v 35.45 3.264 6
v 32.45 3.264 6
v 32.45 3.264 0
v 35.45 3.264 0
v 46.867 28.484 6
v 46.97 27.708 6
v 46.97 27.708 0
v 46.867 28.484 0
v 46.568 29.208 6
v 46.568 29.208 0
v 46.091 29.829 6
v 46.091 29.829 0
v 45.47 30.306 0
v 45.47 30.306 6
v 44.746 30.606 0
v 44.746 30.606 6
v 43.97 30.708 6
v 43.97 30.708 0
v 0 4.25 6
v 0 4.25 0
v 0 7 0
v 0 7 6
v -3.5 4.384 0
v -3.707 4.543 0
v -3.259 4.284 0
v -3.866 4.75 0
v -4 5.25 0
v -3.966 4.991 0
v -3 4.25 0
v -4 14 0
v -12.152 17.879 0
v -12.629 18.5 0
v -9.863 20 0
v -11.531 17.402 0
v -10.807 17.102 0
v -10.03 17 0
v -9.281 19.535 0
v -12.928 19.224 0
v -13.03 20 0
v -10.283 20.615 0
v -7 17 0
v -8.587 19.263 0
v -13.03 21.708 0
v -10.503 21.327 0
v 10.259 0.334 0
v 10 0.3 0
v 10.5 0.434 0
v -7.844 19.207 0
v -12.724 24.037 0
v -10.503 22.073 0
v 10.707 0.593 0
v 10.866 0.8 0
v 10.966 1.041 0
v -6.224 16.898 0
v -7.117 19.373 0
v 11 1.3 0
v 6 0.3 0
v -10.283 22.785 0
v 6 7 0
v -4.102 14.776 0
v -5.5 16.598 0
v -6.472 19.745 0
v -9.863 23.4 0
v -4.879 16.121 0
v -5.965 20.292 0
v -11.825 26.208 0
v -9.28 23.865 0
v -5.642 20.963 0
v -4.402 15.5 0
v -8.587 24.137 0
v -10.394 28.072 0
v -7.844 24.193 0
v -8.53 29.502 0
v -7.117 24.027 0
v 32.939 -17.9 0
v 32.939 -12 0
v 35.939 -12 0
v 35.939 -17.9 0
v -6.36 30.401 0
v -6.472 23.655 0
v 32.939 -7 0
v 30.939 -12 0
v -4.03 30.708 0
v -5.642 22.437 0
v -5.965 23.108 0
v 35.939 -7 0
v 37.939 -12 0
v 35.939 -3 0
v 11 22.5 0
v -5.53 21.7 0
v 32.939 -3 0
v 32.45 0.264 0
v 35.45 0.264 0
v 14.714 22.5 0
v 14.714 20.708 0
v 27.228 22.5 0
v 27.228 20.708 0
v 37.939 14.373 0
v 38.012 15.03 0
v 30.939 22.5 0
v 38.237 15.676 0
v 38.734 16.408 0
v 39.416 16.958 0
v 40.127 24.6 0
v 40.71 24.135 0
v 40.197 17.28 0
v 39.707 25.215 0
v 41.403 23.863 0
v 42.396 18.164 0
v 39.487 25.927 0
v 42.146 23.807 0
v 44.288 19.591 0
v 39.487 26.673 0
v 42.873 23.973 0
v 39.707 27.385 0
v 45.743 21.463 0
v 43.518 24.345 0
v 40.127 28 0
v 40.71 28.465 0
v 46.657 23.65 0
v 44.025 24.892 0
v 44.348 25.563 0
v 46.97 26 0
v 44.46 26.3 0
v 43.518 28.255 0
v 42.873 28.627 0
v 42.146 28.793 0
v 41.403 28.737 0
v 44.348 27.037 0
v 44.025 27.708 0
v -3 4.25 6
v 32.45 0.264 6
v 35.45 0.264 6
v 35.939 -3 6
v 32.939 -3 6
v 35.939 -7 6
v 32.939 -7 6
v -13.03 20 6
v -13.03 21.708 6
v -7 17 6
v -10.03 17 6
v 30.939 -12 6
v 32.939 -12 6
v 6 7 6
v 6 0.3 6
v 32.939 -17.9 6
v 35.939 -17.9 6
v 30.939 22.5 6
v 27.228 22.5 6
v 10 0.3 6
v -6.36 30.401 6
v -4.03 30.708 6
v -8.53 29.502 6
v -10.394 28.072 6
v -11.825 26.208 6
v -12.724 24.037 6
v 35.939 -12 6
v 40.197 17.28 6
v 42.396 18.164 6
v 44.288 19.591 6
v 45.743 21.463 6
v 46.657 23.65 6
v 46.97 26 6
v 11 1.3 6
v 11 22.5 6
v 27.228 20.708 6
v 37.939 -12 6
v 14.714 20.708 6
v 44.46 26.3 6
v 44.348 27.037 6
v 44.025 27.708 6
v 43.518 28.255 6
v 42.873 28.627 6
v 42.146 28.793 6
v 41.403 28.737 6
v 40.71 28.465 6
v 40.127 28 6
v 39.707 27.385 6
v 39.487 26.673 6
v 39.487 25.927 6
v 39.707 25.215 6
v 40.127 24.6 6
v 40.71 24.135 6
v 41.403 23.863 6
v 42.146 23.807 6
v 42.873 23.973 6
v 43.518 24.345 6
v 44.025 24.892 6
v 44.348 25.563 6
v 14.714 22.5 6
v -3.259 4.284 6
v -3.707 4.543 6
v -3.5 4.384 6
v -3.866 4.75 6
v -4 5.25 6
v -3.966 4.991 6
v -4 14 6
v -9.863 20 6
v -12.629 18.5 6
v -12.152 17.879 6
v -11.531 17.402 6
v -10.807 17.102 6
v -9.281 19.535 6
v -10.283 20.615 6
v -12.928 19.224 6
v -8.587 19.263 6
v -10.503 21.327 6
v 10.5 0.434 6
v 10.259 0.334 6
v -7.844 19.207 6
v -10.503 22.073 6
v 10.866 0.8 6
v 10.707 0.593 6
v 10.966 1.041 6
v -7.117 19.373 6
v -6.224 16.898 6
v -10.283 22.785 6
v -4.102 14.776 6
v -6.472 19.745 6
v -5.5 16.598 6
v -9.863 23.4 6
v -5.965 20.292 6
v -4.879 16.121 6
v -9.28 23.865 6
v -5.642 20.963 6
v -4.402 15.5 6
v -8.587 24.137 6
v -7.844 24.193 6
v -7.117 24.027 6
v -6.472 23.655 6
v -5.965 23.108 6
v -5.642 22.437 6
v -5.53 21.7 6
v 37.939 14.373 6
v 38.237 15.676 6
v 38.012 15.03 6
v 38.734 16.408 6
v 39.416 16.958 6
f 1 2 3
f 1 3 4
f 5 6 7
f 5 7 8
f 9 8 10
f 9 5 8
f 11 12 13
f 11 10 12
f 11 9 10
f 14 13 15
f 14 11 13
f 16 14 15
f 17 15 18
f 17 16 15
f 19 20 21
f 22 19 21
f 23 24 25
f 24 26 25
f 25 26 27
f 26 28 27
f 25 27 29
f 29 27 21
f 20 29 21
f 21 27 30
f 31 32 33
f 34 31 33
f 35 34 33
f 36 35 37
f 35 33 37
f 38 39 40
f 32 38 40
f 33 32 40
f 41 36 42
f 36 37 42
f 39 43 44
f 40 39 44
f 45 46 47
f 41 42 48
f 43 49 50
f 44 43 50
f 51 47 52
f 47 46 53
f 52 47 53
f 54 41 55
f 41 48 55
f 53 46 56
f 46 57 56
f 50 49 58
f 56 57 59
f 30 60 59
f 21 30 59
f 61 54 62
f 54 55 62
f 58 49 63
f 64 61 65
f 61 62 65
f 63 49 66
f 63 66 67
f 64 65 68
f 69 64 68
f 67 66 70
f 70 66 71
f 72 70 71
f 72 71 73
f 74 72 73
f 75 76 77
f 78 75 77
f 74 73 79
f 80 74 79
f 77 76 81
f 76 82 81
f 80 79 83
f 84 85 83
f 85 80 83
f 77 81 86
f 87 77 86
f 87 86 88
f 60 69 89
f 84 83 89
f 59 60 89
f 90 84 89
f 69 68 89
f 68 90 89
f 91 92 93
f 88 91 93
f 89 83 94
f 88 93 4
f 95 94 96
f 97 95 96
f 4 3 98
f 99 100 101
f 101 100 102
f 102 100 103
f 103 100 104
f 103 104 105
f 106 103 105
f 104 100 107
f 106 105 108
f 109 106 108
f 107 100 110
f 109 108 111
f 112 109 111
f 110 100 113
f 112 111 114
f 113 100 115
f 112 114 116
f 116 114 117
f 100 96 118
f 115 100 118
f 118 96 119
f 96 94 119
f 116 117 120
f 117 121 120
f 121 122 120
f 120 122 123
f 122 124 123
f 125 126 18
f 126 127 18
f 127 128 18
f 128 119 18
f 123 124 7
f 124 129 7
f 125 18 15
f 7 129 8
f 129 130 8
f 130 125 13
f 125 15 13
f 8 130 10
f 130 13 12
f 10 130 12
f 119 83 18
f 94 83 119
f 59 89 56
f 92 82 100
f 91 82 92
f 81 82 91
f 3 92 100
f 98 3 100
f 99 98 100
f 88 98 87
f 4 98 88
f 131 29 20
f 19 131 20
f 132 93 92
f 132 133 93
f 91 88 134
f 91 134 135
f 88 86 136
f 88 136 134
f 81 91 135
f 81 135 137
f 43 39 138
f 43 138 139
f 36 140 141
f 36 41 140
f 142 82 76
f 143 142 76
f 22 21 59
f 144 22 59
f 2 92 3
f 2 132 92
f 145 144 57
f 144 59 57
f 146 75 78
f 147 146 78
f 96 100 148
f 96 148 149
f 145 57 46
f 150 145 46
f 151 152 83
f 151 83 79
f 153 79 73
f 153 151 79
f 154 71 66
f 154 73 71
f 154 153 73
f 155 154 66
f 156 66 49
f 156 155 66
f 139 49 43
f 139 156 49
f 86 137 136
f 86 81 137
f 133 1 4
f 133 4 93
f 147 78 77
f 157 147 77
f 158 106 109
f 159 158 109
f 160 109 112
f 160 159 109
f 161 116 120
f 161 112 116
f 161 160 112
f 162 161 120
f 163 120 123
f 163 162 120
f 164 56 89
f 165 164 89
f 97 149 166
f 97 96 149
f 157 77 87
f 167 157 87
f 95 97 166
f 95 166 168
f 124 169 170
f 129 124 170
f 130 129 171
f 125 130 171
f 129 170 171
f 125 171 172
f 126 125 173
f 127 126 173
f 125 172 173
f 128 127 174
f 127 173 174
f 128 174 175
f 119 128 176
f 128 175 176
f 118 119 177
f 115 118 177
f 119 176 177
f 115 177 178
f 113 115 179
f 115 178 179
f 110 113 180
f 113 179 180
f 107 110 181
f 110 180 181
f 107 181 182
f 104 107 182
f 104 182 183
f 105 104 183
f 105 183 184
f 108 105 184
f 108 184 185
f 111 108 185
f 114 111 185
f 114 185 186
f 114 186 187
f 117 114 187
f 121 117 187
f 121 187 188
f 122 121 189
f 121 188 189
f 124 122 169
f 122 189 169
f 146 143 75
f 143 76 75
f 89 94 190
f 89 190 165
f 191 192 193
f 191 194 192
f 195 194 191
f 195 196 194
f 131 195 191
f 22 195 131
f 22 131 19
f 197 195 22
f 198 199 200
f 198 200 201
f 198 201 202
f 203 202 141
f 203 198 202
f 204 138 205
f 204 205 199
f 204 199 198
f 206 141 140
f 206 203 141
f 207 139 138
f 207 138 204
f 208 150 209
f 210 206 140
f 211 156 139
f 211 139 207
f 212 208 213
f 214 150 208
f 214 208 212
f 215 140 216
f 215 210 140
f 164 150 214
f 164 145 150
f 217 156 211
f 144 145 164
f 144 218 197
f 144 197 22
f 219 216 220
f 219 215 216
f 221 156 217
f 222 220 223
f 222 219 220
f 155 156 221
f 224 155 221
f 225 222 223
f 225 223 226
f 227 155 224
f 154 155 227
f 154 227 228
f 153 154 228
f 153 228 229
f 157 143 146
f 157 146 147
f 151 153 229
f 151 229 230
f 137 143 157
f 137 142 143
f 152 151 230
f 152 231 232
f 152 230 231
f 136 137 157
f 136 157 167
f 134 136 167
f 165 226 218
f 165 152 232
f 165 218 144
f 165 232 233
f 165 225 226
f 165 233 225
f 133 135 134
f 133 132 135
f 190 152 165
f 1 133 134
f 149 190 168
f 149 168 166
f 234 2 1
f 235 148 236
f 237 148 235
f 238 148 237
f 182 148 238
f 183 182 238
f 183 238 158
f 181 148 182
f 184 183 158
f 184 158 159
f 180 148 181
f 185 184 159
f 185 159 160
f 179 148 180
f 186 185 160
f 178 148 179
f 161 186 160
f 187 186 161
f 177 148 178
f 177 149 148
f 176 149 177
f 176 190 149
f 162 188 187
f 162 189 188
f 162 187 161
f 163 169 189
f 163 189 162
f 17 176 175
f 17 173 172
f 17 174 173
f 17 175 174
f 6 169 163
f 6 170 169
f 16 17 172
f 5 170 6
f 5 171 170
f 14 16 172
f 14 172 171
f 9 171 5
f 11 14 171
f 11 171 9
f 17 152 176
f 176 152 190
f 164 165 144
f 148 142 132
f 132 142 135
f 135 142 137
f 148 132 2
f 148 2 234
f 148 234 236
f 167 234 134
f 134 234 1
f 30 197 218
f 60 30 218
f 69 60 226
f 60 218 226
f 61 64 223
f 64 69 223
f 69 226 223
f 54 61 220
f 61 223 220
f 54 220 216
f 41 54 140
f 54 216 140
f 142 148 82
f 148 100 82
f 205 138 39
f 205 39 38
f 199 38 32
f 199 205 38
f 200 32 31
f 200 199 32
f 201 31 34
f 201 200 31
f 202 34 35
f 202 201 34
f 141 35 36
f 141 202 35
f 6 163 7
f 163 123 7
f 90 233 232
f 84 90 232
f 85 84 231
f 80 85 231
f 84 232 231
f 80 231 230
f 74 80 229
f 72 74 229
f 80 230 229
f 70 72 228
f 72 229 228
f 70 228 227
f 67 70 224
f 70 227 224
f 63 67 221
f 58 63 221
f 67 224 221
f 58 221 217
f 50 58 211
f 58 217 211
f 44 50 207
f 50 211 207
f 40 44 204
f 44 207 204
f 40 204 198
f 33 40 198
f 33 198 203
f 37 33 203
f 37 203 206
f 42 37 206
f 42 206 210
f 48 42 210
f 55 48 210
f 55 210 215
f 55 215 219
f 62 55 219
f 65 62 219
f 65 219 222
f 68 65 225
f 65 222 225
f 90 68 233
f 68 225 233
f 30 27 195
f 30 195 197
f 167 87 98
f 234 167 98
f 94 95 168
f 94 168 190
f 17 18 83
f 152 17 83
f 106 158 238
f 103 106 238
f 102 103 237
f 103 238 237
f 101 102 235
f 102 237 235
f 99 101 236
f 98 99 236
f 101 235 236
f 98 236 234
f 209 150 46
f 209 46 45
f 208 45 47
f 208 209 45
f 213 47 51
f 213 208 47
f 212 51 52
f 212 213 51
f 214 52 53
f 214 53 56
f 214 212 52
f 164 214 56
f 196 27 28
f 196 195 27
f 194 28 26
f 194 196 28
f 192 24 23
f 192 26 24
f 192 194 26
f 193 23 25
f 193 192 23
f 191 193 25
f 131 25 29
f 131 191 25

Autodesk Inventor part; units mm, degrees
ref_plane "YZ Plane" through (0, 0, 0) normal (1, 0, 0) x (0, 1, 0)
ref_plane "XZ Plane" through (0, 0, 0) normal (0, 1, 0) x (-1, 0, 0)
ref_plane "XY Plane" through (0, 0, 0) normal (0, 0, 1) x (1, 0, 0)
sketch "Sketch1" plane through (0, 0, 0) normal (0, 0, 1) x (1, 0, 0)
  line L0 (0, 4.25) -> (0, 7)
  line L1 (0, 7) -> (6, 7)
  line L2 (6, 7) -> (6, 0.3)
  line L3 (6, 0.3) -> (11, 0.3)
  line L4 (11, 0.3) -> (11, 22.5)
  line L5 (-4, 4.25) -> (0, 4.25)
  line L6 (30.939, 22.5) -> (27.2275, 22.5)
  line L7 (27.2275, 22.5) -> (27.2275, 20.708)
  line L8 (27.2275, 20.708) -> (14.7135, 20.708)
  line L9 (14.7135, 20.708) -> (14.7135, 22.5)
  line L10 (14.7135, 22.5) -> (11, 22.5)
  line L11 (30.939, 22.5) -> (30.939, -12)
  line L12 (30.939, -12) -> (32.939, -12)
  line L13 (32.939, -12) -> (32.939, -17.9)
  line L14 (32.939, -17.9) -> (35.939, -17.9)
  line L15 (35.939, -17.9) -> (35.939, -12)
  line L16 (35.939, -12) -> (37.939, -12)
  line L17 (37.939, -12) -> (37.939, 17)
  line L18 (37.939, 17) -> (46.9695, 17)
  line L19 (46.9695, 17) -> (46.9695, 30.708)
  line L20 (-4, 4.25) -> (-4, 17)
  line L21 (-4, 17) -> (-13.0305, 17)
  line L22 (-13.0305, 17) -> (-13.0305, 30.708)
  line L23 (46.9695, 30.708) -> (-13.0305, 30.708)
  dimension "d0" = 6
  dimension "d1" = 6.7
  dimension "d3" = 5
  dimension "d10" = 4
  dimension "d12" = 2.75
  dimension "d15" = 1.792
  dimension "d20" = 3
  dimension "d21" = 2
  dimension "d22" = 5.9
  dimension "d23" = 12.514
  dimension "d24" = 19.939
  dimension "d25" = 3.7135
  dimension "d42" = 13.708
  dimension "d43" = 19
  dimension "d48" = 7
  dimension "d50" = 60
  dimension "d51" = 41.939
  dimension "d52" = 9.0305
  dimension "d65" = 10
  dimension "d66" = 29
extrude "Extrusion1" add sketch "Sketch1" along normal blind 6
sketch "Sketch2" plane through (0, 0, 6) normal (0, 0, 1) x (1, 0, 0)
  line L0 (35.45, 0.264) -> (32.45, 0.264)
  line L1 (32.45, 0.264) -> (32.45, 3.264)
  line L2 (32.45, 3.264) -> (35.45, 3.264)
  line L3 (35.45, 3.264) -> (35.45, 0.264)
  line L4 (34.939, 35.708) -> (-1, 35.708) projected
  line L5 (30.939, 22.5) -> (30.939, -12) projected
  line L6 (32.939, -17.9) -> (35.939, -17.9) projected
  point P0 (0, 0)
  dimension "d26" = 3
  dimension "d27" = 3
  dimension "d61" = 18.164
  dimension "d62" = 1.511
extrude "Extrusion2" cut sketch "Sketch2" against normal blind 10
sketch "Sketch3" plane through (0, 0, 0) normal (0, 0, -1) x (-1, 0, 0)
  line L0 (-32.939, -7) -> (-35.939, -7)
  line L1 (-35.939, -7) -> (-35.939, -3)
  line L2 (-35.939, -3) -> (-32.939, -3)
  line L3 (-32.939, -3) -> (-32.939, -7)
  line L4 (-35.939, -12) -> (-37.939, -12) projected
  line L5 (-37.939, -12) -> (-37.939, 17) projected
  point P0 (0, 0)
  dimension "d32" = 3
  dimension "d33" = 4
  dimension "d34" = 5
  dimension "d63" = 2
extrude "Extrusion3" cut sketch "Sketch3" against normal blind 10
fillet "Fillet4" radius 1 2 edges at (11, 0.3, 3) (-4, 4.25, 3)
sketch "Sketch4" plane through (0, 0, 6) normal (0, 0, 1) x (1, 0, 0)
  circle A0 centre (41.9595, 26.3) radius 2.5
  circle A1 centre (-8.0305, 21.7) radius 2.5
  line L0 (-13.0305, 30.708) -> (-13.0305, 17) projected
  line L1 (-13.0305, 17) -> (-4, 17) projected
  line L2 (46.9695, 17) -> (46.9695, 30.708) projected
  line L3 (37.939, 17) -> (46.9695, 17) projected
  point P0 (0, 0)
  dimension "d45" = 5
  dimension "d46" = 5
  dimension "d53" = 5
  dimension "d67" = 4.7
  dimension "d70" = 5.01
  dimension "d71" = 9.3
extrude "Extrusion4" cut sketch "Sketch4" against normal blind 10
fillet "Fillet6" radius 9 2 edges at (-13.0305, 30.708, 3) (46.9695, 17, 3)
fillet "Fillet7" radius 3 4 edges at (37.939, 17, 3) (46.9695, 30.708, 3) (-4, 17, 3) (-13.0305, 17, 3)
properties part number "Gripper V 10.1 servo bracket bottom 6mm"
